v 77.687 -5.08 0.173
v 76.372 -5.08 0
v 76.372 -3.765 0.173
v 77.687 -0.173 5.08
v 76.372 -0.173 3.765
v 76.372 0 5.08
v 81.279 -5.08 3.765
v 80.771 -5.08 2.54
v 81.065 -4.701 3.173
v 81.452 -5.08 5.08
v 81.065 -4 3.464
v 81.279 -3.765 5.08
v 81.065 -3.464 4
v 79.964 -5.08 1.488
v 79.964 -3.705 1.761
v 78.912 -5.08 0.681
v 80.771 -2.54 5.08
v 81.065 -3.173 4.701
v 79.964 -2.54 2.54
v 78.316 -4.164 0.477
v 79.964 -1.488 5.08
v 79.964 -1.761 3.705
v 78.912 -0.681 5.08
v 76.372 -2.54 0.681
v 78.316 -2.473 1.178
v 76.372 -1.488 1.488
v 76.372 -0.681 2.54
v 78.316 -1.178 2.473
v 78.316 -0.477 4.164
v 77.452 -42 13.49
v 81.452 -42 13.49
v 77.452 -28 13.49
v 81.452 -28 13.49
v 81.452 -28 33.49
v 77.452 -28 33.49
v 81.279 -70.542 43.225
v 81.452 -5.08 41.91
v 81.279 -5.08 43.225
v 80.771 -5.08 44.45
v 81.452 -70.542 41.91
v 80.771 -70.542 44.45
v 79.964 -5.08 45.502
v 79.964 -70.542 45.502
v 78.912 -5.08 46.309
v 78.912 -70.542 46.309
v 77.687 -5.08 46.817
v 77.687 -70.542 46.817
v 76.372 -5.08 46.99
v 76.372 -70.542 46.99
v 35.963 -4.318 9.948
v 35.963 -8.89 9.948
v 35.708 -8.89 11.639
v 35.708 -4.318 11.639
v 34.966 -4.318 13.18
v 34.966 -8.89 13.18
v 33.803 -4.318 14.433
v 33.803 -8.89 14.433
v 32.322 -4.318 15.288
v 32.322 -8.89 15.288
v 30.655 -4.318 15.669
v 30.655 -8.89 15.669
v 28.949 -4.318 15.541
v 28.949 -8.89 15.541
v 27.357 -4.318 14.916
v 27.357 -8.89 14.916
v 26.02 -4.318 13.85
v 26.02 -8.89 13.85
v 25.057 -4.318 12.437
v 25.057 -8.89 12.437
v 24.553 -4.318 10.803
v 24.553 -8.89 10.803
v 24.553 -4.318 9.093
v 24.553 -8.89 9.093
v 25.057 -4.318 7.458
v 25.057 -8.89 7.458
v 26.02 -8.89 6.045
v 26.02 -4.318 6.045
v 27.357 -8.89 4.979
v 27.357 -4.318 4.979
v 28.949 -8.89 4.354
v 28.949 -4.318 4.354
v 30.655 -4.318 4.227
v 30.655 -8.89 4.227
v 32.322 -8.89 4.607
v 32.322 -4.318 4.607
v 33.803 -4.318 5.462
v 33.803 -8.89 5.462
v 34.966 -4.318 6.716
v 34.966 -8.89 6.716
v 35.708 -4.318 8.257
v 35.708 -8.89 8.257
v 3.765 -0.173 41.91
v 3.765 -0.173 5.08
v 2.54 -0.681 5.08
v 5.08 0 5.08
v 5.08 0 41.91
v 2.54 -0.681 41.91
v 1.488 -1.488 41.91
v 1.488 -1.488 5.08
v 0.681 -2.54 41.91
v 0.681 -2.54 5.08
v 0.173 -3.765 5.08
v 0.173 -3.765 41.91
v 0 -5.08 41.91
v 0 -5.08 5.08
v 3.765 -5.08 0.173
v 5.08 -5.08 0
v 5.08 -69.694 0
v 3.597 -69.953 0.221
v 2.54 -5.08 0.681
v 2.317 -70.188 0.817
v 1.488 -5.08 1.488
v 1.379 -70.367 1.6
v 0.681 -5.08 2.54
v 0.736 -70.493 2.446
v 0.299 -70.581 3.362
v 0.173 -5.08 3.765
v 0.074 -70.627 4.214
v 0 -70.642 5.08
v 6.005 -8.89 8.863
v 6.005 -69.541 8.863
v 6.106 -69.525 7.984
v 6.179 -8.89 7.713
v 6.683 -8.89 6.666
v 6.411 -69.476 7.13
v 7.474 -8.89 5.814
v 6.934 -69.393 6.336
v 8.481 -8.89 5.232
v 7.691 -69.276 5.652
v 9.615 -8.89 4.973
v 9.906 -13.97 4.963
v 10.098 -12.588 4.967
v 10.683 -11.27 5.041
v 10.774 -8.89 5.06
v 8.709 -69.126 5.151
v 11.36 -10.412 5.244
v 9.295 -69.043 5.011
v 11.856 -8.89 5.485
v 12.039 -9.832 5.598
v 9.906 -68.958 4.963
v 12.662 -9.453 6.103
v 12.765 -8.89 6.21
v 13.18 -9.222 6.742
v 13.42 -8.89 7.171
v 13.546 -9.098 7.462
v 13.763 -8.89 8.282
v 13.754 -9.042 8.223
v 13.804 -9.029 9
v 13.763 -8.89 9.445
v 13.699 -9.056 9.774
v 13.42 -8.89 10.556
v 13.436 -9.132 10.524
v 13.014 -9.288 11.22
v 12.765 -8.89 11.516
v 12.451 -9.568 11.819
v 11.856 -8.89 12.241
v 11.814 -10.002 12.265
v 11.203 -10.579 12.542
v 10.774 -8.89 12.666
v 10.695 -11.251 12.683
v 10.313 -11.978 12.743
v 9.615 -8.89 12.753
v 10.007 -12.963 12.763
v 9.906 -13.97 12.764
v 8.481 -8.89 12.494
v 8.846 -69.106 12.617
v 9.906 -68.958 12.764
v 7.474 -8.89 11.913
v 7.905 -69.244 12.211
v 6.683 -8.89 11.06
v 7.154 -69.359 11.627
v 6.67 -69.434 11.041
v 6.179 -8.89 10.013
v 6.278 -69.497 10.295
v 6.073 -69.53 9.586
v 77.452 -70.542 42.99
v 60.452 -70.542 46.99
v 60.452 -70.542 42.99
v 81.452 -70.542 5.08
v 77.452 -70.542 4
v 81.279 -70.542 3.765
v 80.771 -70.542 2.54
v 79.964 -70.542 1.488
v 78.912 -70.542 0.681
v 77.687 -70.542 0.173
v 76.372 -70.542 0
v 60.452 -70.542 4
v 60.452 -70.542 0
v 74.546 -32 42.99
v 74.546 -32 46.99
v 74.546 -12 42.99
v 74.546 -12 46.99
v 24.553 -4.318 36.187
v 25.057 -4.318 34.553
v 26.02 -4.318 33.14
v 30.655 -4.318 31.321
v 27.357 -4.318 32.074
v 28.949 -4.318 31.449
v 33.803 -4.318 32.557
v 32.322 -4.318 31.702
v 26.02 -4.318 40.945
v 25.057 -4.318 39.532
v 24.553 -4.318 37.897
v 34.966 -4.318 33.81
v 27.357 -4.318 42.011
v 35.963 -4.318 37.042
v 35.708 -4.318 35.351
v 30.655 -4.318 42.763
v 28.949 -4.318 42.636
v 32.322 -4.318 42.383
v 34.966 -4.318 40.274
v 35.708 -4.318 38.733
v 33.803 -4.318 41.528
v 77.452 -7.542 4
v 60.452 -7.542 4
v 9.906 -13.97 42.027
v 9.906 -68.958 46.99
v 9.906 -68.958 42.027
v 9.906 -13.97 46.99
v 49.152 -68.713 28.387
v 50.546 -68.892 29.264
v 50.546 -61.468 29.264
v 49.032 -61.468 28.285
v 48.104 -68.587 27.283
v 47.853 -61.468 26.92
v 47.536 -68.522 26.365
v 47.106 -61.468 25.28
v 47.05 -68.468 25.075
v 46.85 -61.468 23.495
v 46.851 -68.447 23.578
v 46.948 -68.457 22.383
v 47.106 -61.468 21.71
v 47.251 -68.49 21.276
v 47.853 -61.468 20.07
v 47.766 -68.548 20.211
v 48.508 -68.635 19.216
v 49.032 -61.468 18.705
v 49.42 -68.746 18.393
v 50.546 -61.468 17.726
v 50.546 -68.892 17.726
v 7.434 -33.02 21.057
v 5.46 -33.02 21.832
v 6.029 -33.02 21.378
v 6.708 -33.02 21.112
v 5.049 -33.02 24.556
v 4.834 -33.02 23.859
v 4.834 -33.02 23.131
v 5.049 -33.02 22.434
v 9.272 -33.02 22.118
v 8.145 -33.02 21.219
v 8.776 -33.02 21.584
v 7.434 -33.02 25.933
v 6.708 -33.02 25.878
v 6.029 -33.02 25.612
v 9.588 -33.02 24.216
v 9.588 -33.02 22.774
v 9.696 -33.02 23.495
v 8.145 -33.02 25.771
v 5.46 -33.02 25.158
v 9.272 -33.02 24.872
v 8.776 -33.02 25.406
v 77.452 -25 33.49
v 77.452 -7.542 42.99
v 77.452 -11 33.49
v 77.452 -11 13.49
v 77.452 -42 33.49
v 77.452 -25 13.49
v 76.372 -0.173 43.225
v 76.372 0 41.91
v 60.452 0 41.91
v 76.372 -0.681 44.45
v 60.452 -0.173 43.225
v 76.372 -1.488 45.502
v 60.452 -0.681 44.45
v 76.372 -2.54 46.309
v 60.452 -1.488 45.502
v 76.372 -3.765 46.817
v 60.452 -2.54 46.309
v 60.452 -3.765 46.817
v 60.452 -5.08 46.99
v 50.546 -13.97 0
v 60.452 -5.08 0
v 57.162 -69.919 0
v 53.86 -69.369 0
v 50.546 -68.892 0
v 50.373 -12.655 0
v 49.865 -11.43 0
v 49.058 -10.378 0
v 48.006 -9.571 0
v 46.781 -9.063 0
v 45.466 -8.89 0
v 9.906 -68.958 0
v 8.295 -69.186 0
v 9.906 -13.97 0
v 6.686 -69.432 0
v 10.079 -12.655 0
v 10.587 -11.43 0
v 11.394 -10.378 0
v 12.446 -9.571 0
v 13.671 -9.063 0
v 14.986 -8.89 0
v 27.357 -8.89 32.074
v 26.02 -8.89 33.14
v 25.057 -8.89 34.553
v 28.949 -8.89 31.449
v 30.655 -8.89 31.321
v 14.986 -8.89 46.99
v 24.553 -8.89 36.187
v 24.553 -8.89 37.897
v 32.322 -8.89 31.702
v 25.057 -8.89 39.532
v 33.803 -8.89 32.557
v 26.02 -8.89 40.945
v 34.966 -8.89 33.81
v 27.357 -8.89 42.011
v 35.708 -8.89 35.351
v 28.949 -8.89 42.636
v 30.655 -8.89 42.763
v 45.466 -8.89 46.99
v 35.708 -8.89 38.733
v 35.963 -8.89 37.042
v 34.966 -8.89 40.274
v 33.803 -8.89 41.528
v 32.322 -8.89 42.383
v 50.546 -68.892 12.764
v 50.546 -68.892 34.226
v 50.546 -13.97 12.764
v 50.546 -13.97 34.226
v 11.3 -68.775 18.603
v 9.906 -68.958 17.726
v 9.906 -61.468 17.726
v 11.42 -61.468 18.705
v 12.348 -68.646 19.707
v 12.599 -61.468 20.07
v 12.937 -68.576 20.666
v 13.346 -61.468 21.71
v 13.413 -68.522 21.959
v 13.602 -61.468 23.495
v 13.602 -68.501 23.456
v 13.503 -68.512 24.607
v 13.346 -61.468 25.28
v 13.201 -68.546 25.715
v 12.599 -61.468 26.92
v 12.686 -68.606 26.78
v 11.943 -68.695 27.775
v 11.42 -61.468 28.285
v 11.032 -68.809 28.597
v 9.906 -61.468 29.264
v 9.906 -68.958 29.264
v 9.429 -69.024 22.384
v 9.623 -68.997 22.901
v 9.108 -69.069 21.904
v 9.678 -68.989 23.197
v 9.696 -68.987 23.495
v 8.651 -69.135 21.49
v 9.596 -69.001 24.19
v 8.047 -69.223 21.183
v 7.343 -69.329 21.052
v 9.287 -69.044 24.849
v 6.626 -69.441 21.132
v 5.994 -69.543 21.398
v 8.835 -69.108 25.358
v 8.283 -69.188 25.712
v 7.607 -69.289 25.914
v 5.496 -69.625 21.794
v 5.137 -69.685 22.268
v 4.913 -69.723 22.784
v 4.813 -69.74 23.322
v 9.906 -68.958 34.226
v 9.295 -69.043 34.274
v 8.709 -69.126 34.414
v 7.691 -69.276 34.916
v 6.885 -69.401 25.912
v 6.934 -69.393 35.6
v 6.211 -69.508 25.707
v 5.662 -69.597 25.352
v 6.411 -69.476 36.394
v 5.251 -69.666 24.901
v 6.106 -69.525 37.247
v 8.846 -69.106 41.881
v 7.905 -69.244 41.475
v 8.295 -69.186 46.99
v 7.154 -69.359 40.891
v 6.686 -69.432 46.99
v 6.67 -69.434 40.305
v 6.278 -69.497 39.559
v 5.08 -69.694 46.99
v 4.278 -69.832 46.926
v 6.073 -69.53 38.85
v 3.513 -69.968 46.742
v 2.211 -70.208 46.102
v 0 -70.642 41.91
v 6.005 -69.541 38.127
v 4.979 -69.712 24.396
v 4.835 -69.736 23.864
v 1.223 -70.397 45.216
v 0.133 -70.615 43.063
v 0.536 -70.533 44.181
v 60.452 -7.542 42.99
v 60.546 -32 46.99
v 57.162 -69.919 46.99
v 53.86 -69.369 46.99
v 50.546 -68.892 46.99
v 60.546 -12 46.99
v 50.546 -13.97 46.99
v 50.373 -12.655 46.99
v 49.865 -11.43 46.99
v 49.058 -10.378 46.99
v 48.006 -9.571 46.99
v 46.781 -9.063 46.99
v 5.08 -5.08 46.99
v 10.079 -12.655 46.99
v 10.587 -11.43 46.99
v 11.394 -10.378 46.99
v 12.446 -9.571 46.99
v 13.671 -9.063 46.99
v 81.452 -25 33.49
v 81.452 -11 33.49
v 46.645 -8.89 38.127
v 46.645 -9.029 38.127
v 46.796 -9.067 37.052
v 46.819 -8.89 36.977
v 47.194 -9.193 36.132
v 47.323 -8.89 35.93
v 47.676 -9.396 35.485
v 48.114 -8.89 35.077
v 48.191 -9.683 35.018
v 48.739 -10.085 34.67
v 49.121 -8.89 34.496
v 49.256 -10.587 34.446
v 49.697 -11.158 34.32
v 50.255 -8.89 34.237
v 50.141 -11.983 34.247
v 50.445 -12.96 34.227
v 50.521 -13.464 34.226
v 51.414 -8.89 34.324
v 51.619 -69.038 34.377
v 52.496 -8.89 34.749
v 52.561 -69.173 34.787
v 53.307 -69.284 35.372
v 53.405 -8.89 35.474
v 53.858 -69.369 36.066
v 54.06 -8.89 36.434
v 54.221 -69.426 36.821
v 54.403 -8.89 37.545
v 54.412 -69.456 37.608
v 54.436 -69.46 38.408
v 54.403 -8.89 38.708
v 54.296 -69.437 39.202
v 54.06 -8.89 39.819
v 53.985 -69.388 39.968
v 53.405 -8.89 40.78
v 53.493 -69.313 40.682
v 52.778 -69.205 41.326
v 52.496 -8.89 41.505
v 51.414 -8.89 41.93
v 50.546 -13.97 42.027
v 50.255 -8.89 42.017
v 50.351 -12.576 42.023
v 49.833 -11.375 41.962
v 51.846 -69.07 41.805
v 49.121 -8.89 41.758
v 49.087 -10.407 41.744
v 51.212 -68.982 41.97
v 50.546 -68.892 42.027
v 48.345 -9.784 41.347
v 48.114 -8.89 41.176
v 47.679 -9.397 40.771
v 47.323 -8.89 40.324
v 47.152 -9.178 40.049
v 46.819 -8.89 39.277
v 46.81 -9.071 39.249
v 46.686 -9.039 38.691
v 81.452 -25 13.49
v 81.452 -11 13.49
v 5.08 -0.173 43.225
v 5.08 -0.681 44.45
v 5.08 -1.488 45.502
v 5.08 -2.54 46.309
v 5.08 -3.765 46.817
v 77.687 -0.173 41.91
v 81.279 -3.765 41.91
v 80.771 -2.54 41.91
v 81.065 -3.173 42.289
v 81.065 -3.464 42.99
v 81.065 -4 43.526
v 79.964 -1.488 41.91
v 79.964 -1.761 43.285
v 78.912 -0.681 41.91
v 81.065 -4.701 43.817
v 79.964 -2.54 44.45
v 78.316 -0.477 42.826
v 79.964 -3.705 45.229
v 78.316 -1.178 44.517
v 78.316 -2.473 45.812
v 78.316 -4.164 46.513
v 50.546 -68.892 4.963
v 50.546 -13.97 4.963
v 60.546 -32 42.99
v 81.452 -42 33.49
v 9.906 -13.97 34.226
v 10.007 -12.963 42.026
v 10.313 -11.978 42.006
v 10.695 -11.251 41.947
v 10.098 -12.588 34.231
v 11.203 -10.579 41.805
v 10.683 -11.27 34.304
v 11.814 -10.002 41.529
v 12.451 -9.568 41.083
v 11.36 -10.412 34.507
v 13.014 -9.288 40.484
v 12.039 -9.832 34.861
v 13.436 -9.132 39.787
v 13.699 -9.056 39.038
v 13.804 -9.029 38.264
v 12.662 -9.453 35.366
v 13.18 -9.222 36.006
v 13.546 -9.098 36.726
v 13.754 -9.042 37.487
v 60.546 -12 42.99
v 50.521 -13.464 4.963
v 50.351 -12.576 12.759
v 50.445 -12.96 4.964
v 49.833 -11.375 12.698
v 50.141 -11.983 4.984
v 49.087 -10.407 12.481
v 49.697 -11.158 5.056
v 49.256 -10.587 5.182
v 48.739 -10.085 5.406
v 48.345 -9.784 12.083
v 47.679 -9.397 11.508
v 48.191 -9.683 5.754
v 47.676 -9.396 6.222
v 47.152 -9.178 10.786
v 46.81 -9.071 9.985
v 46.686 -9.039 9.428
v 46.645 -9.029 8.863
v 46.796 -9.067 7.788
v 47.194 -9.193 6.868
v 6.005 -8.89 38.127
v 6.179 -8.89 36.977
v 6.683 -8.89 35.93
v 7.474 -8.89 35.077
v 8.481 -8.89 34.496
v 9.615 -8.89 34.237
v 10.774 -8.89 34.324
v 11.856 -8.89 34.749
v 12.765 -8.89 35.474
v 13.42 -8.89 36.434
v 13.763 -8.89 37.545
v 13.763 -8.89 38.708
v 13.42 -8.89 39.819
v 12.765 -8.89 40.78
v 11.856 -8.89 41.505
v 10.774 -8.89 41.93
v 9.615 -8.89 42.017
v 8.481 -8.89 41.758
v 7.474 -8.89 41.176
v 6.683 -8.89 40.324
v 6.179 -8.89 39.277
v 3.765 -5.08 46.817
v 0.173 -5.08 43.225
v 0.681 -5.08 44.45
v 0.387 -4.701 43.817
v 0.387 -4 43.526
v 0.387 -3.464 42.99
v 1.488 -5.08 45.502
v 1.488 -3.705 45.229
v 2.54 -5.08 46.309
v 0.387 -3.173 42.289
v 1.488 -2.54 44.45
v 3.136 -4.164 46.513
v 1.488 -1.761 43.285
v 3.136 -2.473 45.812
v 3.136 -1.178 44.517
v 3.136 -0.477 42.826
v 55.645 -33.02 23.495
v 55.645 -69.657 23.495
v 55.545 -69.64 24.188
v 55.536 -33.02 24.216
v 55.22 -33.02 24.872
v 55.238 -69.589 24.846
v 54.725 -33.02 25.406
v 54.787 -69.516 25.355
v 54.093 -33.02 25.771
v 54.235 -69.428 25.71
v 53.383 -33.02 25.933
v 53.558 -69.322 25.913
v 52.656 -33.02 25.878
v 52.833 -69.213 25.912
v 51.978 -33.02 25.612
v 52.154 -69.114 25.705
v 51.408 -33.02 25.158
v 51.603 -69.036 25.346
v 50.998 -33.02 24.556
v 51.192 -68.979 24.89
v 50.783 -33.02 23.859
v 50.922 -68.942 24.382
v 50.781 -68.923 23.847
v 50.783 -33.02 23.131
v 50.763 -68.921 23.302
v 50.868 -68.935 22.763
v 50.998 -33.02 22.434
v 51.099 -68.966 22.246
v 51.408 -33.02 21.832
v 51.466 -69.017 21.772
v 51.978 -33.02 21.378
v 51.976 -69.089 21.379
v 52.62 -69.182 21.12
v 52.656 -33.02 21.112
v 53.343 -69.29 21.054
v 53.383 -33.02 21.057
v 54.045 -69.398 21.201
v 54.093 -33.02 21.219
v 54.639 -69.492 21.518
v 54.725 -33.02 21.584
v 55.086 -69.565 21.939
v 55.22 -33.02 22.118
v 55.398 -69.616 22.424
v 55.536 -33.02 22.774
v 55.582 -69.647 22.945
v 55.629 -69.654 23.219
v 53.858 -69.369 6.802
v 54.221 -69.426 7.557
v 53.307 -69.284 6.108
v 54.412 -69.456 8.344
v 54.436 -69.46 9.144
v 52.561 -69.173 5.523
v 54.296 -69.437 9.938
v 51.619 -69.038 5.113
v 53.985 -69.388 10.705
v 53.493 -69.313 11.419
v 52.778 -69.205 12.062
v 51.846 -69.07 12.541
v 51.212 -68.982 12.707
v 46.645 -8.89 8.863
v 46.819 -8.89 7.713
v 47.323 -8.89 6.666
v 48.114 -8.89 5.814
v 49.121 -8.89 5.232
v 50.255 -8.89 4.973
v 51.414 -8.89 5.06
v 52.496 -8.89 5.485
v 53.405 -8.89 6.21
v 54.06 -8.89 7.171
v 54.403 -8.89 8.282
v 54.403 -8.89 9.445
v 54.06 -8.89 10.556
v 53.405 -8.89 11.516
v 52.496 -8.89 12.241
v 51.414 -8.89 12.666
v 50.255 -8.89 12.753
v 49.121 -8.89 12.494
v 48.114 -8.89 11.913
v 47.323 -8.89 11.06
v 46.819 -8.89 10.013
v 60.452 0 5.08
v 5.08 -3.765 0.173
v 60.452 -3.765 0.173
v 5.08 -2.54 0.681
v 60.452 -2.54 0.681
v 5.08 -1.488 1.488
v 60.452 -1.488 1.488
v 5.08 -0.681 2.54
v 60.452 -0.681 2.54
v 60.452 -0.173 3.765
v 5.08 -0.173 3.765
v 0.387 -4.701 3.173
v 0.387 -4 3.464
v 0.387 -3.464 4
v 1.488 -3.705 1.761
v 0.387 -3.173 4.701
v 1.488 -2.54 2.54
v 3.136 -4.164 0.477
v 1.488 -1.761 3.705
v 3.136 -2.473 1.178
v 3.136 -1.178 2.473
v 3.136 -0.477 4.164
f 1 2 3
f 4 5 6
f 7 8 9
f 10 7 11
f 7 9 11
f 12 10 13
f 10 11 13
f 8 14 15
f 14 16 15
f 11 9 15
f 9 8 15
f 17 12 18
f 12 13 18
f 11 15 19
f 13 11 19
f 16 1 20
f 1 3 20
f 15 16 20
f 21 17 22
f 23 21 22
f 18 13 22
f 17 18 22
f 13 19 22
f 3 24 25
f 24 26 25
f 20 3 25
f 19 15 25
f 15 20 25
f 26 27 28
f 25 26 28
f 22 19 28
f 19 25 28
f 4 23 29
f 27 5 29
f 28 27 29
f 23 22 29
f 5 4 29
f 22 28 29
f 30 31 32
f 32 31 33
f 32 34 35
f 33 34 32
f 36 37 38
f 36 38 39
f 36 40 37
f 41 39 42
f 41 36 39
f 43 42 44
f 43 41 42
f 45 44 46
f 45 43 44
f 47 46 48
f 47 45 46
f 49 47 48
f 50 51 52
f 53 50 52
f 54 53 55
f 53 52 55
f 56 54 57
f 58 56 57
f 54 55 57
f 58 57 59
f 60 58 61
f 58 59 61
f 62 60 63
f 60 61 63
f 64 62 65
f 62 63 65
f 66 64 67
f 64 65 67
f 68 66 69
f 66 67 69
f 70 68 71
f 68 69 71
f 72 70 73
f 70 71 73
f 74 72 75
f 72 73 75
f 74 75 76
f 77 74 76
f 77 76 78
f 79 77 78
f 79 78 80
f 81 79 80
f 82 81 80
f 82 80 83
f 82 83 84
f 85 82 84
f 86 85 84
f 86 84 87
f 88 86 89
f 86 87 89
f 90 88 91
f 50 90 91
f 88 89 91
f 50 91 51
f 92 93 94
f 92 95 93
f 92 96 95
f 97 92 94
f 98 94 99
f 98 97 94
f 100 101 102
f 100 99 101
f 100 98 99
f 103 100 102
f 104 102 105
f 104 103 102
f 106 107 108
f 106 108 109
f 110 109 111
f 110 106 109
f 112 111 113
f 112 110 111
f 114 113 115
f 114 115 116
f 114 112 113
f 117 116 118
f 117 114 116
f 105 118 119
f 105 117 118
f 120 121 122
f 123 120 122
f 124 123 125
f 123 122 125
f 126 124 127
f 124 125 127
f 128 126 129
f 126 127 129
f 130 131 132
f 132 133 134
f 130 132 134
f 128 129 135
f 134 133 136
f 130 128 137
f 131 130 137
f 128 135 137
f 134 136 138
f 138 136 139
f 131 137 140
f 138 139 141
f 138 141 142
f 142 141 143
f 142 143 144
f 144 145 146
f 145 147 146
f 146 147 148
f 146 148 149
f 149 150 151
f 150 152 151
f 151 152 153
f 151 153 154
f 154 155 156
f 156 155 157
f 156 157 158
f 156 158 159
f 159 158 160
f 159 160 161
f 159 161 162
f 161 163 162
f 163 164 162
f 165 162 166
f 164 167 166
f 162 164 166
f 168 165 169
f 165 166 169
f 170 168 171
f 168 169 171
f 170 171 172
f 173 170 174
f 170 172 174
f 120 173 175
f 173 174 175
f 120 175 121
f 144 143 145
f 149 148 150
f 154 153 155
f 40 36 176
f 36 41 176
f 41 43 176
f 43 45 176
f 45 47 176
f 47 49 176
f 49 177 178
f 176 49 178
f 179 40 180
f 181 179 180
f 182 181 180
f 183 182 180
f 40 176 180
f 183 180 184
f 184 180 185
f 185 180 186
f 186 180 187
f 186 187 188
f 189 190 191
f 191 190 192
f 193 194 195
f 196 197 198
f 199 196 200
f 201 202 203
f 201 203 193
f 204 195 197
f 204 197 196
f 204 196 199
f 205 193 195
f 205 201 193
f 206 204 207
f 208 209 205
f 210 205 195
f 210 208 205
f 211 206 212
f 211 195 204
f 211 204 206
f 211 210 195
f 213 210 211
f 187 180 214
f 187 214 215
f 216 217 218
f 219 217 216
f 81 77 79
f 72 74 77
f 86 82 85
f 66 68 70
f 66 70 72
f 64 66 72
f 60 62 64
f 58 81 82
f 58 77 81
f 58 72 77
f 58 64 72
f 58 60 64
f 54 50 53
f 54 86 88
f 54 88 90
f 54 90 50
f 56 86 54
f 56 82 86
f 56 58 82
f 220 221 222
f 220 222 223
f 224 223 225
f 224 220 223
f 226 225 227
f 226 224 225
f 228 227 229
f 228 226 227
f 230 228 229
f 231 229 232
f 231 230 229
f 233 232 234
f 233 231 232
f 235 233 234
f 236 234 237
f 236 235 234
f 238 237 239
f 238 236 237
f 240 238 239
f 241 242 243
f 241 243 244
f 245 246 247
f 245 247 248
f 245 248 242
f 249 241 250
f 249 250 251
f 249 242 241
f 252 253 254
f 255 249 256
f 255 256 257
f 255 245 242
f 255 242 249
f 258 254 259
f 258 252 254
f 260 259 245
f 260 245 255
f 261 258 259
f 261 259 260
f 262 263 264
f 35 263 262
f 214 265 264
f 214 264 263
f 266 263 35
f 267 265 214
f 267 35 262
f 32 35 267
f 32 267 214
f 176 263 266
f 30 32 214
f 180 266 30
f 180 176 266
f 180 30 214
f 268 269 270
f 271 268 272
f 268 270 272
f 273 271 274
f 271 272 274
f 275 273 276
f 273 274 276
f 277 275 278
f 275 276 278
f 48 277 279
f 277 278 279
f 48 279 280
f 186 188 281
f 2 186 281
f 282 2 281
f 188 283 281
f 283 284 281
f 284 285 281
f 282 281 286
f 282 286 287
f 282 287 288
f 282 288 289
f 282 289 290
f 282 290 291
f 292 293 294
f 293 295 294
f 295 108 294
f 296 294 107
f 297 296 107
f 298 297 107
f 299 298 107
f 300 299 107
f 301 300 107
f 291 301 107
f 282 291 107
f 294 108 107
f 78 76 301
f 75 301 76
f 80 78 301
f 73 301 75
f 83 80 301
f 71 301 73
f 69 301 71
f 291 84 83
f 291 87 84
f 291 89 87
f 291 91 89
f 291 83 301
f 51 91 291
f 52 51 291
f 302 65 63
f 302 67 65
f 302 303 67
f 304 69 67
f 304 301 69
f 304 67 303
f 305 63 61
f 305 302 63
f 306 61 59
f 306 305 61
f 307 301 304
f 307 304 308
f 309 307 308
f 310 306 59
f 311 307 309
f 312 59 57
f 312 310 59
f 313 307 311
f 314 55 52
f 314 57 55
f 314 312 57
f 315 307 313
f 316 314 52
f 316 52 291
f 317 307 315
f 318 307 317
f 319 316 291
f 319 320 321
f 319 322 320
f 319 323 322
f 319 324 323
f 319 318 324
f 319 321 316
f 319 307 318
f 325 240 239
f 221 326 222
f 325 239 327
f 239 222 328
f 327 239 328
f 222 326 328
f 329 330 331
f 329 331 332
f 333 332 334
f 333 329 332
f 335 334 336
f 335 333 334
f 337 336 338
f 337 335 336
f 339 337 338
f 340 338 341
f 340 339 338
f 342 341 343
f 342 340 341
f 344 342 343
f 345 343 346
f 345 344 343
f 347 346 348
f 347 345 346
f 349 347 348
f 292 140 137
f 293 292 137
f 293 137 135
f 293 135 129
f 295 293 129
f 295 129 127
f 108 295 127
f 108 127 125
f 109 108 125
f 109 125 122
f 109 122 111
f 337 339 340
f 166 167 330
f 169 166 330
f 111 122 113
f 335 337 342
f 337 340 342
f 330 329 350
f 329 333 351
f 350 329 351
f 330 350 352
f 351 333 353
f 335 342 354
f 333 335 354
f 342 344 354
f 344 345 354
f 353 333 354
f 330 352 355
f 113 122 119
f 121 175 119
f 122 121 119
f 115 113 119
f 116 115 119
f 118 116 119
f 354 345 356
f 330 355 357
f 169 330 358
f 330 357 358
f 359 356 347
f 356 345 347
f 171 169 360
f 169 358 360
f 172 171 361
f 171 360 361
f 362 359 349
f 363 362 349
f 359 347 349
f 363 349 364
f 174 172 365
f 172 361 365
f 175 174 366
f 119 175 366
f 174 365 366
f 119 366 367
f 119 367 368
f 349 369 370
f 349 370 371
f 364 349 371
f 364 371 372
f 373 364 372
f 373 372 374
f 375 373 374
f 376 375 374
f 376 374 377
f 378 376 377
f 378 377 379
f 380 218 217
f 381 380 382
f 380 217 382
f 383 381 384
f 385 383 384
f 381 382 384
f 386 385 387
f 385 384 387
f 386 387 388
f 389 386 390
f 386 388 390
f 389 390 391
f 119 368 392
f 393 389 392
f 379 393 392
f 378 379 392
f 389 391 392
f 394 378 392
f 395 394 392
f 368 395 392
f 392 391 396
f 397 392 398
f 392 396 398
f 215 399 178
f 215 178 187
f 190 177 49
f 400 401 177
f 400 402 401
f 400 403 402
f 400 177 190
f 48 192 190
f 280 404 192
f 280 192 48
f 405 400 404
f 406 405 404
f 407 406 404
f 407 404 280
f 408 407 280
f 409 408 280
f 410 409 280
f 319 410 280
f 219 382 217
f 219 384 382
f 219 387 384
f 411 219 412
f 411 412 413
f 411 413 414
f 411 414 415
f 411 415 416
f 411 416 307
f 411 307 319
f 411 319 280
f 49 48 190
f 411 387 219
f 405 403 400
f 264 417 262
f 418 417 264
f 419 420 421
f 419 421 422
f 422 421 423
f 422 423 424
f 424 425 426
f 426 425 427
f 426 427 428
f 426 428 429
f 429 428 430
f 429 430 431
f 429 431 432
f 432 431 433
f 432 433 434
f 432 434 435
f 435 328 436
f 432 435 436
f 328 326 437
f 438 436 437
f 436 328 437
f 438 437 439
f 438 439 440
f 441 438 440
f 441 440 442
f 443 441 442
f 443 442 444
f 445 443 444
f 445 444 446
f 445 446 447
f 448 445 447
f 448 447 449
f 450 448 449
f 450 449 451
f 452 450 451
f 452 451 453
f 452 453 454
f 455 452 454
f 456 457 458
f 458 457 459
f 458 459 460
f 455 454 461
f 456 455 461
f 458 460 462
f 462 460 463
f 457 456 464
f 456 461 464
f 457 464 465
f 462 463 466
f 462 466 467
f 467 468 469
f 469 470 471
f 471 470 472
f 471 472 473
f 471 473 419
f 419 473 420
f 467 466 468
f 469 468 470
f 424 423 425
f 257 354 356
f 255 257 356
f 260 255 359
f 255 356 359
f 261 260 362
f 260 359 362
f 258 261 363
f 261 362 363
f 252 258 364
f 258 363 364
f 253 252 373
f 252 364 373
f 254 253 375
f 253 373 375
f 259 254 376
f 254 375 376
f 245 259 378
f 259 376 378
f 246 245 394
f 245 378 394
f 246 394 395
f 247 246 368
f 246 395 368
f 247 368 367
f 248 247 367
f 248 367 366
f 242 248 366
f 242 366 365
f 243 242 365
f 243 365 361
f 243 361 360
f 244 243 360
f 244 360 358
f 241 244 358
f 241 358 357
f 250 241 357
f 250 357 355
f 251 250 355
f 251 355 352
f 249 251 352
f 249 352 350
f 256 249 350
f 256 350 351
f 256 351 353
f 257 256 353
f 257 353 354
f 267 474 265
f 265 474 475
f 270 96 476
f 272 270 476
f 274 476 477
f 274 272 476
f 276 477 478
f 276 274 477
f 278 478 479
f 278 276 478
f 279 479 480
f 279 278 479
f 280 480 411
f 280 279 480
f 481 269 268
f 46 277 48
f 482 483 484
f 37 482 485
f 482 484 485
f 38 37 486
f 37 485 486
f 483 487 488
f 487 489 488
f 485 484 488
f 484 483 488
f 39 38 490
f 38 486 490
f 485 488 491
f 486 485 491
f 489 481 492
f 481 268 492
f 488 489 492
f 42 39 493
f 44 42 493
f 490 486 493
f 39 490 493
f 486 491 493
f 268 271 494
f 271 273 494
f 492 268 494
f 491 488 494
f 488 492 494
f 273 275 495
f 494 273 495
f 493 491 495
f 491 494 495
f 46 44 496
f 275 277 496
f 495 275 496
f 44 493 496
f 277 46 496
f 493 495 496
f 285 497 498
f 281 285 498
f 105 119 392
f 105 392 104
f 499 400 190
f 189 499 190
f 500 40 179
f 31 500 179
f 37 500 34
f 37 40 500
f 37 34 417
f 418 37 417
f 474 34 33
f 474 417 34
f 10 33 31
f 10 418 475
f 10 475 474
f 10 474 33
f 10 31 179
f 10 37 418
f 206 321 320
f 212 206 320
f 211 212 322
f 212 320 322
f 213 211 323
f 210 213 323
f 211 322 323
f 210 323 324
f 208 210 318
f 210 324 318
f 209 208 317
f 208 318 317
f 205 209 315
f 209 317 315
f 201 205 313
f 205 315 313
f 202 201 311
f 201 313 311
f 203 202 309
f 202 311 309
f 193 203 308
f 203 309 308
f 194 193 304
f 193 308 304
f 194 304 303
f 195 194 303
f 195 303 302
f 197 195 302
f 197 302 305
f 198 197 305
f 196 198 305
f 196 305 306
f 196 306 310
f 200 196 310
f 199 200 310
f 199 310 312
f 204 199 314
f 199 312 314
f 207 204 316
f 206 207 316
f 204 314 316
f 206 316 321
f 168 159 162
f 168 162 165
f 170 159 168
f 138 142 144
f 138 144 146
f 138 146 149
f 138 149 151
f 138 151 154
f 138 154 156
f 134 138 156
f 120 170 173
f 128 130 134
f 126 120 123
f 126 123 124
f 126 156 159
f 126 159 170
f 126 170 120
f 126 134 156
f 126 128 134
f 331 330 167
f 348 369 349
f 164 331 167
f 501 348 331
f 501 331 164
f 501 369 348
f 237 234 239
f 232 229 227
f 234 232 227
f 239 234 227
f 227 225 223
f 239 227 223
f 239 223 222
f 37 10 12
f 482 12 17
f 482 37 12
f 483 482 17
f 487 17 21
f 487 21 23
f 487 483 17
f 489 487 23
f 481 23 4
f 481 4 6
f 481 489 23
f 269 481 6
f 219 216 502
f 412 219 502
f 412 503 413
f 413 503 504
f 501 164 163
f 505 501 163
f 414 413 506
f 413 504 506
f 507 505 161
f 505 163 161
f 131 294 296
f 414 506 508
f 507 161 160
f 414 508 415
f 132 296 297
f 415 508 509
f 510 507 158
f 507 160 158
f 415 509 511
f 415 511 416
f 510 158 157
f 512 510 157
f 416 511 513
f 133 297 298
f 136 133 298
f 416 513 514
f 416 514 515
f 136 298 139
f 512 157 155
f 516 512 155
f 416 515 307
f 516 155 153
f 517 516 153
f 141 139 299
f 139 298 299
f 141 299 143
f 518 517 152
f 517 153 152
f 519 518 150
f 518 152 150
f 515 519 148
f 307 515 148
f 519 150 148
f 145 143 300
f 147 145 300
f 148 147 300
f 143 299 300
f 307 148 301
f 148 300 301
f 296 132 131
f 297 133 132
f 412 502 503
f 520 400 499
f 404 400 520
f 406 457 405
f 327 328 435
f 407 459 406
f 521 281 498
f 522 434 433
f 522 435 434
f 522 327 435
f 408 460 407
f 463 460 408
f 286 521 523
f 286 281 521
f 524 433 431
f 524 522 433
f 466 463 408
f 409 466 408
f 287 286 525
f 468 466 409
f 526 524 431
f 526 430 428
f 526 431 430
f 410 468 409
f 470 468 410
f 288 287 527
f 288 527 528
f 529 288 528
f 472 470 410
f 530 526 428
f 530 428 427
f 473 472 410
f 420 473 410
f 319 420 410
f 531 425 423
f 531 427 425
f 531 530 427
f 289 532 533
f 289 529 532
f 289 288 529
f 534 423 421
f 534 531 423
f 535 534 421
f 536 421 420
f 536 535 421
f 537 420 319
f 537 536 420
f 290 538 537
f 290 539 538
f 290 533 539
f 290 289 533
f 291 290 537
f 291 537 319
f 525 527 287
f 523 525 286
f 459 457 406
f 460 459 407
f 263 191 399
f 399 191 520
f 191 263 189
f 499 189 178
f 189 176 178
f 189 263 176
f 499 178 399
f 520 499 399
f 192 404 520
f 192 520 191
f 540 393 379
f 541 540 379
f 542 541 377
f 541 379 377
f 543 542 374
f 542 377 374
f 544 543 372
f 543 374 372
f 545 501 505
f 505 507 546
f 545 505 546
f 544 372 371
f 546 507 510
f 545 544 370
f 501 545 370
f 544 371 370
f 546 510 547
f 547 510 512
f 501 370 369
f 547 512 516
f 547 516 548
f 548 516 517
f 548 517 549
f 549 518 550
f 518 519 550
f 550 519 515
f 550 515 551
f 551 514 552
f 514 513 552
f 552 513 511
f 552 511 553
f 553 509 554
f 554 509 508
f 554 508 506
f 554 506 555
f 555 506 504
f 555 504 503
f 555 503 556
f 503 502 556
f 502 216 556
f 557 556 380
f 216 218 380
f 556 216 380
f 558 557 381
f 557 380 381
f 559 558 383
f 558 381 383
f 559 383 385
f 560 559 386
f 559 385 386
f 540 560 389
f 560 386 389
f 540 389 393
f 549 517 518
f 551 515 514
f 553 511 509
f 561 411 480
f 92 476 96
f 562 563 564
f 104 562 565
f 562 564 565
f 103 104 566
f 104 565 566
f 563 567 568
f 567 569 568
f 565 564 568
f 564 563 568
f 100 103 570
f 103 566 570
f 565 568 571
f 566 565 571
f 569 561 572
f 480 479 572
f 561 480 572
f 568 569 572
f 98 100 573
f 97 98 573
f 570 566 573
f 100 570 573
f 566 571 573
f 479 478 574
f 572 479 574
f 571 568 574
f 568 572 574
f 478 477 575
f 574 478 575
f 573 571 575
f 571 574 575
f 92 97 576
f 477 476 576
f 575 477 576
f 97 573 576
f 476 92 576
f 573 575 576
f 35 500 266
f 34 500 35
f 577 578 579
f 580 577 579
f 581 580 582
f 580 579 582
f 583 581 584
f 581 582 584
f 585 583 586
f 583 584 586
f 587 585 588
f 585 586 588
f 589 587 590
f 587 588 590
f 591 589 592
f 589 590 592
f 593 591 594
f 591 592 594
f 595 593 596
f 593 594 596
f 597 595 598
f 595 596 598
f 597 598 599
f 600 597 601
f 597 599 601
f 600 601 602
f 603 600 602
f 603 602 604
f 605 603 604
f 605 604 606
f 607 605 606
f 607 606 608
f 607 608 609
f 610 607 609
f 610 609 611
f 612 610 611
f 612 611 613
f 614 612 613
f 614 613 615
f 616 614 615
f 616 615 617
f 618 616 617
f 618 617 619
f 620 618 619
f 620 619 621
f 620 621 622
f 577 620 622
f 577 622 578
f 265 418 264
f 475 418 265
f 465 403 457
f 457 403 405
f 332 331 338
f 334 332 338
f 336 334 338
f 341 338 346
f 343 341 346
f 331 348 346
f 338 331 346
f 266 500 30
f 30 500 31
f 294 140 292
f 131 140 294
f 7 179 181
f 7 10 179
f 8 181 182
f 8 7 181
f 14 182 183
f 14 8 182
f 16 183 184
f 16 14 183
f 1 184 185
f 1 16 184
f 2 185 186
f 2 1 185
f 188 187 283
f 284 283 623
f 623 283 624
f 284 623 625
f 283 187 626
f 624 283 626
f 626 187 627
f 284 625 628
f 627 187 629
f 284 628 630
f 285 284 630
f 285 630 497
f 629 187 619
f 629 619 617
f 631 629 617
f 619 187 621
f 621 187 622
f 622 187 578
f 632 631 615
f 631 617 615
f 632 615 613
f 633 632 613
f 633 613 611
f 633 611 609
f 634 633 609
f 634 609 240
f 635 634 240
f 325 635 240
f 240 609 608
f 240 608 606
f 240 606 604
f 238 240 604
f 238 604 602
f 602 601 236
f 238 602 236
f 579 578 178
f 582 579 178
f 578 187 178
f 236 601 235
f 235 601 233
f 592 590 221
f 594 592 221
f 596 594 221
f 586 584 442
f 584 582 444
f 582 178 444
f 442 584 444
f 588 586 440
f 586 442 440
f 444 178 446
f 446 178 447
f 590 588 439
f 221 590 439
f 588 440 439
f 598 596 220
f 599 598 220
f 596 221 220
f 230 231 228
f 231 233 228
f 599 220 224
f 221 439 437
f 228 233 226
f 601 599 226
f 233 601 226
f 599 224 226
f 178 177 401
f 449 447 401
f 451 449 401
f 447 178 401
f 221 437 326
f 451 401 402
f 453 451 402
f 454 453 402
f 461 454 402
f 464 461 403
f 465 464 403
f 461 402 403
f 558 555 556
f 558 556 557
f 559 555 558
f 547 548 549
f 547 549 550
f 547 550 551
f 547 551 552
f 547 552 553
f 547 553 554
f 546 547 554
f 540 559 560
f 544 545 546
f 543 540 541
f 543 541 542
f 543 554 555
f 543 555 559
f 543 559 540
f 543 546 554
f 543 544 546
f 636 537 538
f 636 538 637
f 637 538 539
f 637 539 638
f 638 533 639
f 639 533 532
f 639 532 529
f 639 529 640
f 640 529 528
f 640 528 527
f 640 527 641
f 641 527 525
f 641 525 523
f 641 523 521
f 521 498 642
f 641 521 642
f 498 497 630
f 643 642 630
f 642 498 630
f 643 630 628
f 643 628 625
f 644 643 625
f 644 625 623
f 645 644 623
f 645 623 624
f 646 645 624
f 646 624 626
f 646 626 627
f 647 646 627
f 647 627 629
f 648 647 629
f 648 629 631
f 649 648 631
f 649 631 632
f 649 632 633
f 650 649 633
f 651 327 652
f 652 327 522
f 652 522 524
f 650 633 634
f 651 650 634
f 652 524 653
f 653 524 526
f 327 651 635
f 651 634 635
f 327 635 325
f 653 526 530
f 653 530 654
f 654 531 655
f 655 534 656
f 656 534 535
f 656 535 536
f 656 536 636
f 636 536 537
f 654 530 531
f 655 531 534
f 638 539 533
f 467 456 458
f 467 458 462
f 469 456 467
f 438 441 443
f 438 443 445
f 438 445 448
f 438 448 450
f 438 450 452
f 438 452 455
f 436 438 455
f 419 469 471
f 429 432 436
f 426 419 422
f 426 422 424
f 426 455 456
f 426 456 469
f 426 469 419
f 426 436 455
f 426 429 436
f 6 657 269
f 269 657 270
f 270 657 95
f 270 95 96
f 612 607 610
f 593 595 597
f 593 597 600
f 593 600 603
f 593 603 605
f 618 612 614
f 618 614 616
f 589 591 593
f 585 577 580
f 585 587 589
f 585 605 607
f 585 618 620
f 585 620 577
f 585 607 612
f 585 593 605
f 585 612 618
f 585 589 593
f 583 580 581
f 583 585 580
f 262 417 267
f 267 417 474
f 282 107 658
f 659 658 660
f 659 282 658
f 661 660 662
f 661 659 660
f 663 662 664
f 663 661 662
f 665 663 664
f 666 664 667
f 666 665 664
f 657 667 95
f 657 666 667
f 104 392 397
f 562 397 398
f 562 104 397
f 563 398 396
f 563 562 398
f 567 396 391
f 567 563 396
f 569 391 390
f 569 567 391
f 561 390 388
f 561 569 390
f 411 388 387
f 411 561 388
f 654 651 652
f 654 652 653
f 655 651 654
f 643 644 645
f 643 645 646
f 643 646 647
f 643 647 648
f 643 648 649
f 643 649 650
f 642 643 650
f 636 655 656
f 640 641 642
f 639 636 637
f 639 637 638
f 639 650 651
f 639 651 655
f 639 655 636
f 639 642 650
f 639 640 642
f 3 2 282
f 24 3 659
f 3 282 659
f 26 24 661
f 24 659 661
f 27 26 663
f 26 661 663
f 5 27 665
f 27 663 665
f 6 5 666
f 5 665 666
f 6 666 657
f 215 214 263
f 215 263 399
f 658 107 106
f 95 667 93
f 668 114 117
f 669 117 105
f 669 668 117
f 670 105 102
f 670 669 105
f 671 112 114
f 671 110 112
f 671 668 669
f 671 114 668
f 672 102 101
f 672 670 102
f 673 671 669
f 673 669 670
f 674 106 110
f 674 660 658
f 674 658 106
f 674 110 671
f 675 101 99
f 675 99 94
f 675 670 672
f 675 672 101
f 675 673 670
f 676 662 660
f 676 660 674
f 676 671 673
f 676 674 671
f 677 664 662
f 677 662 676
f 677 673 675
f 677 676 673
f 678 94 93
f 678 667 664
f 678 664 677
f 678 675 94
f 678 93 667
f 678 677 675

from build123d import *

# Parameters (mm, degrees)
SKETCH1_W           = 60.452
SKETCH1_H           = 71.12
BOSS_EXTRUDE1_DEPTH = 46.99
SKETCH2_W           = 40.64
SKETCH2_H           = 85.320739167
CUT_EXTRUDE1_DEPTH  = 46.99
SKETCH3_R           = 2.44475
CUT_EXTRUDE2_DEPTH  = 30.734
SKETCH5_R           = 6.35
BOSS_EXTRUDE4_DEPTH = 9.652
SKETCH3_5_R         = 2.44475
CUT_EXTRUDE3_DEPTH  = 38.1
FILLET1_R           = 5.08
SKETCH9_R           = 5.737107227
CUT_EXTRUDE6_DEPTH  = 4.572
SKETCH10_R          = 3.900639461
CUT_EXTRUDE10_DEPTH = 62.23
SKETCH8_R           = 152.4
CUT_EXTRUDE11_DEPTH = 55.372
SKETCH11_W          = 46.99
SKETCH11_H          = 65.461586673
BOSS_EXTRUDE6_DEPTH = 21
SKETCH12_W          = 17
SKETCH12_H          = 38.99
CUT_EXTRUDE12_DEPTH = 63
FILLET2_R           = 5.08
SKETCH25_W          = 20
SKETCH25_H          = 14
CUT_EXTRUDE13_DEPTH = 10
SKETCH26_W          = 14
SKETCH26_H          = 20
CUT_EXTRUDE14_DEPTH = 10


with BuildPart() as part:
    # Sketch1 → Boss-Extrude1 (new body)
    with BuildSketch(Plane.XY):
        with Locations((30.226, -35.56)):
            Rectangle(SKETCH1_W, SKETCH1_H)
    extrude(amount=BOSS_EXTRUDE1_DEPTH)

    # Sketch2 → Cut-Extrude1 (cut)
    with BuildSketch(Plane.XY.offset(46.99)):
        with Locations((30.226, -51.550369584)):
            Rectangle(SKETCH2_W, SKETCH2_H)
    extrude(amount=-CUT_EXTRUDE1_DEPTH, mode=Mode.SUBTRACT)

    # Sketch3 → Cut-Extrude2 (cut)
    with BuildSketch(Plane.XZ.offset(71.12)):
        with Locations((53.2003, 23.495)):
            Circle(SKETCH3_R)
        with Locations((7.2517, 23.495)):
            Circle(SKETCH3_R)
    extrude(amount=-CUT_EXTRUDE2_DEPTH, mode=Mode.SUBTRACT)

    # Sketch5 → Boss-Extrude4 (add)
    with BuildSketch(Plane.XZ.offset(71.12)):
        with Locations((7.2517, 23.495)):
            Circle(SKETCH5_R)
        with Locations((53.2003, 23.495)):
            Circle(SKETCH5_R)
    extrude(amount=-BOSS_EXTRUDE4_DEPTH)

    # Sketch3<5> → Cut-Extrude3 (cut)
    with BuildSketch(Plane.XZ.offset(71.12)):
        with Locations((53.2003, 23.495)):
            Circle(SKETCH3_5_R)
        with Locations((7.2517, 23.495)):
            Circle(SKETCH3_5_R)
    extrude(amount=-CUT_EXTRUDE3_DEPTH, mode=Mode.SUBTRACT)

    # Fillet1
    fillet1_edges = [part.edges().sort_by_distance(p)[0] for p in [
        (30.226, 0, 46.99),
        (50.546, -8.89, 23.495),
        (9.906, -8.89, 23.495),
        (0, -35.56, 46.99),
        (30.226, 0, 0),
        (0, -35.56, 0),
        (0, 0, 23.495),
    ]]
    fillet(fillet1_edges, radius=FILLET1_R)

    # Sketch9 → Cut-Extrude6 (cut)
    with BuildSketch(Plane.XZ.offset(8.89)):
        with Locations((30.226, 37.042280921)):
            Circle(SKETCH9_R)
        with Locations((30.226, 9.947719079)):
            Circle(SKETCH9_R)
    extrude(amount=-CUT_EXTRUDE6_DEPTH, mode=Mode.SUBTRACT)

    # Sketch10 → Cut-Extrude10 (cut)
    with BuildSketch(Plane(origin=(0, -71.12, 0), x_dir=(-1, 0, 0), z_dir=(0, -1, 0))):
        with Locations((-9.906, -38.126819309)):
            Circle(SKETCH10_R)
        with Locations((-9.906, -8.863180691)):
            Circle(SKETCH10_R)
        with Locations((-50.546, -38.126819309)):
            Circle(SKETCH10_R)
        with Locations((-50.546, -8.863180691)):
            Circle(SKETCH10_R)
    extrude(amount=-CUT_EXTRUDE10_DEPTH, mode=Mode.SUBTRACT)

    # Sketch8 → Cut-Extrude11 (cut)
    with BuildSketch(Plane.XY.offset(46.99)):
        with Locations((30.473524119, -219.963977846)):
            Circle(SKETCH8_R)
    extrude(amount=-CUT_EXTRUDE11_DEPTH, mode=Mode.SUBTRACT)

    # Sketch11 → Boss-Extrude6 (add)
    with BuildSketch(Plane(origin=(60.452, 0, 0), x_dir=(0, 0, -1), z_dir=(1, 0, 0))):
        with BuildLine():
            Line((-46.99, -5.08), (0, -5.08))
            ThreePointArc((0, -5.08), (-1.487897552, -1.487897552), (-5.08, 0))
            Line((-5.08, 0), (-41.91, 0))
            ThreePointArc((-41.91, 0), (-45.502102448, -1.487897552), (-46.99, -5.08))
        make_face()
        with Locations((-23.495, -37.810793336)):
            Rectangle(SKETCH11_W, SKETCH11_H)
    extrude(amount=BOSS_EXTRUDE6_DEPTH)

    # Sketch12 → Cut-Extrude12 (cut)
    with BuildSketch(Plane(origin=(0, -70.541586673, 0), x_dir=(-1, 0, 0), z_dir=(0, -1, 0))):
        with Locations((-68.952, -23.495)):
            Rectangle(SKETCH12_W, SKETCH12_H)
    extrude(amount=-CUT_EXTRUDE12_DEPTH, mode=Mode.SUBTRACT)

    # Fillet2
    fillet2_edges = [part.edges().sort_by_distance(p)[0] for p in [
        (81.452, -1.487897552, 45.502102448),
        (81.452, -37.810793337, 46.99),
        (81.452, -37.810793337, 0),
        (81.452, -1.487897552, 1.487897552),
        (81.452, 0, 23.495),
    ]]
    fillet(fillet2_edges, radius=FILLET2_R)

    # Sketch25 → Cut-Extrude13 (cut)
    with BuildSketch(Plane(origin=(81.452, 0, 0), x_dir=(0, 0, -1), z_dir=(1, 0, 0))):
        with Locations((-23.49, -18)):
            Rectangle(SKETCH25_W, SKETCH25_H)
        with Locations((-23.49, -35)):
            Rectangle(SKETCH25_W, SKETCH25_H)
    extrude(amount=-CUT_EXTRUDE13_DEPTH, mode=Mode.SUBTRACT)

    # Sketch26 → Cut-Extrude14 (cut)
    with BuildSketch(Plane.XY.offset(46.99)):
        with Locations((67.546, -22)):
            Rectangle(SKETCH26_W, SKETCH26_H)
    extrude(amount=-CUT_EXTRUDE14_DEPTH, mode=Mode.SUBTRACT)


solid = part.part
